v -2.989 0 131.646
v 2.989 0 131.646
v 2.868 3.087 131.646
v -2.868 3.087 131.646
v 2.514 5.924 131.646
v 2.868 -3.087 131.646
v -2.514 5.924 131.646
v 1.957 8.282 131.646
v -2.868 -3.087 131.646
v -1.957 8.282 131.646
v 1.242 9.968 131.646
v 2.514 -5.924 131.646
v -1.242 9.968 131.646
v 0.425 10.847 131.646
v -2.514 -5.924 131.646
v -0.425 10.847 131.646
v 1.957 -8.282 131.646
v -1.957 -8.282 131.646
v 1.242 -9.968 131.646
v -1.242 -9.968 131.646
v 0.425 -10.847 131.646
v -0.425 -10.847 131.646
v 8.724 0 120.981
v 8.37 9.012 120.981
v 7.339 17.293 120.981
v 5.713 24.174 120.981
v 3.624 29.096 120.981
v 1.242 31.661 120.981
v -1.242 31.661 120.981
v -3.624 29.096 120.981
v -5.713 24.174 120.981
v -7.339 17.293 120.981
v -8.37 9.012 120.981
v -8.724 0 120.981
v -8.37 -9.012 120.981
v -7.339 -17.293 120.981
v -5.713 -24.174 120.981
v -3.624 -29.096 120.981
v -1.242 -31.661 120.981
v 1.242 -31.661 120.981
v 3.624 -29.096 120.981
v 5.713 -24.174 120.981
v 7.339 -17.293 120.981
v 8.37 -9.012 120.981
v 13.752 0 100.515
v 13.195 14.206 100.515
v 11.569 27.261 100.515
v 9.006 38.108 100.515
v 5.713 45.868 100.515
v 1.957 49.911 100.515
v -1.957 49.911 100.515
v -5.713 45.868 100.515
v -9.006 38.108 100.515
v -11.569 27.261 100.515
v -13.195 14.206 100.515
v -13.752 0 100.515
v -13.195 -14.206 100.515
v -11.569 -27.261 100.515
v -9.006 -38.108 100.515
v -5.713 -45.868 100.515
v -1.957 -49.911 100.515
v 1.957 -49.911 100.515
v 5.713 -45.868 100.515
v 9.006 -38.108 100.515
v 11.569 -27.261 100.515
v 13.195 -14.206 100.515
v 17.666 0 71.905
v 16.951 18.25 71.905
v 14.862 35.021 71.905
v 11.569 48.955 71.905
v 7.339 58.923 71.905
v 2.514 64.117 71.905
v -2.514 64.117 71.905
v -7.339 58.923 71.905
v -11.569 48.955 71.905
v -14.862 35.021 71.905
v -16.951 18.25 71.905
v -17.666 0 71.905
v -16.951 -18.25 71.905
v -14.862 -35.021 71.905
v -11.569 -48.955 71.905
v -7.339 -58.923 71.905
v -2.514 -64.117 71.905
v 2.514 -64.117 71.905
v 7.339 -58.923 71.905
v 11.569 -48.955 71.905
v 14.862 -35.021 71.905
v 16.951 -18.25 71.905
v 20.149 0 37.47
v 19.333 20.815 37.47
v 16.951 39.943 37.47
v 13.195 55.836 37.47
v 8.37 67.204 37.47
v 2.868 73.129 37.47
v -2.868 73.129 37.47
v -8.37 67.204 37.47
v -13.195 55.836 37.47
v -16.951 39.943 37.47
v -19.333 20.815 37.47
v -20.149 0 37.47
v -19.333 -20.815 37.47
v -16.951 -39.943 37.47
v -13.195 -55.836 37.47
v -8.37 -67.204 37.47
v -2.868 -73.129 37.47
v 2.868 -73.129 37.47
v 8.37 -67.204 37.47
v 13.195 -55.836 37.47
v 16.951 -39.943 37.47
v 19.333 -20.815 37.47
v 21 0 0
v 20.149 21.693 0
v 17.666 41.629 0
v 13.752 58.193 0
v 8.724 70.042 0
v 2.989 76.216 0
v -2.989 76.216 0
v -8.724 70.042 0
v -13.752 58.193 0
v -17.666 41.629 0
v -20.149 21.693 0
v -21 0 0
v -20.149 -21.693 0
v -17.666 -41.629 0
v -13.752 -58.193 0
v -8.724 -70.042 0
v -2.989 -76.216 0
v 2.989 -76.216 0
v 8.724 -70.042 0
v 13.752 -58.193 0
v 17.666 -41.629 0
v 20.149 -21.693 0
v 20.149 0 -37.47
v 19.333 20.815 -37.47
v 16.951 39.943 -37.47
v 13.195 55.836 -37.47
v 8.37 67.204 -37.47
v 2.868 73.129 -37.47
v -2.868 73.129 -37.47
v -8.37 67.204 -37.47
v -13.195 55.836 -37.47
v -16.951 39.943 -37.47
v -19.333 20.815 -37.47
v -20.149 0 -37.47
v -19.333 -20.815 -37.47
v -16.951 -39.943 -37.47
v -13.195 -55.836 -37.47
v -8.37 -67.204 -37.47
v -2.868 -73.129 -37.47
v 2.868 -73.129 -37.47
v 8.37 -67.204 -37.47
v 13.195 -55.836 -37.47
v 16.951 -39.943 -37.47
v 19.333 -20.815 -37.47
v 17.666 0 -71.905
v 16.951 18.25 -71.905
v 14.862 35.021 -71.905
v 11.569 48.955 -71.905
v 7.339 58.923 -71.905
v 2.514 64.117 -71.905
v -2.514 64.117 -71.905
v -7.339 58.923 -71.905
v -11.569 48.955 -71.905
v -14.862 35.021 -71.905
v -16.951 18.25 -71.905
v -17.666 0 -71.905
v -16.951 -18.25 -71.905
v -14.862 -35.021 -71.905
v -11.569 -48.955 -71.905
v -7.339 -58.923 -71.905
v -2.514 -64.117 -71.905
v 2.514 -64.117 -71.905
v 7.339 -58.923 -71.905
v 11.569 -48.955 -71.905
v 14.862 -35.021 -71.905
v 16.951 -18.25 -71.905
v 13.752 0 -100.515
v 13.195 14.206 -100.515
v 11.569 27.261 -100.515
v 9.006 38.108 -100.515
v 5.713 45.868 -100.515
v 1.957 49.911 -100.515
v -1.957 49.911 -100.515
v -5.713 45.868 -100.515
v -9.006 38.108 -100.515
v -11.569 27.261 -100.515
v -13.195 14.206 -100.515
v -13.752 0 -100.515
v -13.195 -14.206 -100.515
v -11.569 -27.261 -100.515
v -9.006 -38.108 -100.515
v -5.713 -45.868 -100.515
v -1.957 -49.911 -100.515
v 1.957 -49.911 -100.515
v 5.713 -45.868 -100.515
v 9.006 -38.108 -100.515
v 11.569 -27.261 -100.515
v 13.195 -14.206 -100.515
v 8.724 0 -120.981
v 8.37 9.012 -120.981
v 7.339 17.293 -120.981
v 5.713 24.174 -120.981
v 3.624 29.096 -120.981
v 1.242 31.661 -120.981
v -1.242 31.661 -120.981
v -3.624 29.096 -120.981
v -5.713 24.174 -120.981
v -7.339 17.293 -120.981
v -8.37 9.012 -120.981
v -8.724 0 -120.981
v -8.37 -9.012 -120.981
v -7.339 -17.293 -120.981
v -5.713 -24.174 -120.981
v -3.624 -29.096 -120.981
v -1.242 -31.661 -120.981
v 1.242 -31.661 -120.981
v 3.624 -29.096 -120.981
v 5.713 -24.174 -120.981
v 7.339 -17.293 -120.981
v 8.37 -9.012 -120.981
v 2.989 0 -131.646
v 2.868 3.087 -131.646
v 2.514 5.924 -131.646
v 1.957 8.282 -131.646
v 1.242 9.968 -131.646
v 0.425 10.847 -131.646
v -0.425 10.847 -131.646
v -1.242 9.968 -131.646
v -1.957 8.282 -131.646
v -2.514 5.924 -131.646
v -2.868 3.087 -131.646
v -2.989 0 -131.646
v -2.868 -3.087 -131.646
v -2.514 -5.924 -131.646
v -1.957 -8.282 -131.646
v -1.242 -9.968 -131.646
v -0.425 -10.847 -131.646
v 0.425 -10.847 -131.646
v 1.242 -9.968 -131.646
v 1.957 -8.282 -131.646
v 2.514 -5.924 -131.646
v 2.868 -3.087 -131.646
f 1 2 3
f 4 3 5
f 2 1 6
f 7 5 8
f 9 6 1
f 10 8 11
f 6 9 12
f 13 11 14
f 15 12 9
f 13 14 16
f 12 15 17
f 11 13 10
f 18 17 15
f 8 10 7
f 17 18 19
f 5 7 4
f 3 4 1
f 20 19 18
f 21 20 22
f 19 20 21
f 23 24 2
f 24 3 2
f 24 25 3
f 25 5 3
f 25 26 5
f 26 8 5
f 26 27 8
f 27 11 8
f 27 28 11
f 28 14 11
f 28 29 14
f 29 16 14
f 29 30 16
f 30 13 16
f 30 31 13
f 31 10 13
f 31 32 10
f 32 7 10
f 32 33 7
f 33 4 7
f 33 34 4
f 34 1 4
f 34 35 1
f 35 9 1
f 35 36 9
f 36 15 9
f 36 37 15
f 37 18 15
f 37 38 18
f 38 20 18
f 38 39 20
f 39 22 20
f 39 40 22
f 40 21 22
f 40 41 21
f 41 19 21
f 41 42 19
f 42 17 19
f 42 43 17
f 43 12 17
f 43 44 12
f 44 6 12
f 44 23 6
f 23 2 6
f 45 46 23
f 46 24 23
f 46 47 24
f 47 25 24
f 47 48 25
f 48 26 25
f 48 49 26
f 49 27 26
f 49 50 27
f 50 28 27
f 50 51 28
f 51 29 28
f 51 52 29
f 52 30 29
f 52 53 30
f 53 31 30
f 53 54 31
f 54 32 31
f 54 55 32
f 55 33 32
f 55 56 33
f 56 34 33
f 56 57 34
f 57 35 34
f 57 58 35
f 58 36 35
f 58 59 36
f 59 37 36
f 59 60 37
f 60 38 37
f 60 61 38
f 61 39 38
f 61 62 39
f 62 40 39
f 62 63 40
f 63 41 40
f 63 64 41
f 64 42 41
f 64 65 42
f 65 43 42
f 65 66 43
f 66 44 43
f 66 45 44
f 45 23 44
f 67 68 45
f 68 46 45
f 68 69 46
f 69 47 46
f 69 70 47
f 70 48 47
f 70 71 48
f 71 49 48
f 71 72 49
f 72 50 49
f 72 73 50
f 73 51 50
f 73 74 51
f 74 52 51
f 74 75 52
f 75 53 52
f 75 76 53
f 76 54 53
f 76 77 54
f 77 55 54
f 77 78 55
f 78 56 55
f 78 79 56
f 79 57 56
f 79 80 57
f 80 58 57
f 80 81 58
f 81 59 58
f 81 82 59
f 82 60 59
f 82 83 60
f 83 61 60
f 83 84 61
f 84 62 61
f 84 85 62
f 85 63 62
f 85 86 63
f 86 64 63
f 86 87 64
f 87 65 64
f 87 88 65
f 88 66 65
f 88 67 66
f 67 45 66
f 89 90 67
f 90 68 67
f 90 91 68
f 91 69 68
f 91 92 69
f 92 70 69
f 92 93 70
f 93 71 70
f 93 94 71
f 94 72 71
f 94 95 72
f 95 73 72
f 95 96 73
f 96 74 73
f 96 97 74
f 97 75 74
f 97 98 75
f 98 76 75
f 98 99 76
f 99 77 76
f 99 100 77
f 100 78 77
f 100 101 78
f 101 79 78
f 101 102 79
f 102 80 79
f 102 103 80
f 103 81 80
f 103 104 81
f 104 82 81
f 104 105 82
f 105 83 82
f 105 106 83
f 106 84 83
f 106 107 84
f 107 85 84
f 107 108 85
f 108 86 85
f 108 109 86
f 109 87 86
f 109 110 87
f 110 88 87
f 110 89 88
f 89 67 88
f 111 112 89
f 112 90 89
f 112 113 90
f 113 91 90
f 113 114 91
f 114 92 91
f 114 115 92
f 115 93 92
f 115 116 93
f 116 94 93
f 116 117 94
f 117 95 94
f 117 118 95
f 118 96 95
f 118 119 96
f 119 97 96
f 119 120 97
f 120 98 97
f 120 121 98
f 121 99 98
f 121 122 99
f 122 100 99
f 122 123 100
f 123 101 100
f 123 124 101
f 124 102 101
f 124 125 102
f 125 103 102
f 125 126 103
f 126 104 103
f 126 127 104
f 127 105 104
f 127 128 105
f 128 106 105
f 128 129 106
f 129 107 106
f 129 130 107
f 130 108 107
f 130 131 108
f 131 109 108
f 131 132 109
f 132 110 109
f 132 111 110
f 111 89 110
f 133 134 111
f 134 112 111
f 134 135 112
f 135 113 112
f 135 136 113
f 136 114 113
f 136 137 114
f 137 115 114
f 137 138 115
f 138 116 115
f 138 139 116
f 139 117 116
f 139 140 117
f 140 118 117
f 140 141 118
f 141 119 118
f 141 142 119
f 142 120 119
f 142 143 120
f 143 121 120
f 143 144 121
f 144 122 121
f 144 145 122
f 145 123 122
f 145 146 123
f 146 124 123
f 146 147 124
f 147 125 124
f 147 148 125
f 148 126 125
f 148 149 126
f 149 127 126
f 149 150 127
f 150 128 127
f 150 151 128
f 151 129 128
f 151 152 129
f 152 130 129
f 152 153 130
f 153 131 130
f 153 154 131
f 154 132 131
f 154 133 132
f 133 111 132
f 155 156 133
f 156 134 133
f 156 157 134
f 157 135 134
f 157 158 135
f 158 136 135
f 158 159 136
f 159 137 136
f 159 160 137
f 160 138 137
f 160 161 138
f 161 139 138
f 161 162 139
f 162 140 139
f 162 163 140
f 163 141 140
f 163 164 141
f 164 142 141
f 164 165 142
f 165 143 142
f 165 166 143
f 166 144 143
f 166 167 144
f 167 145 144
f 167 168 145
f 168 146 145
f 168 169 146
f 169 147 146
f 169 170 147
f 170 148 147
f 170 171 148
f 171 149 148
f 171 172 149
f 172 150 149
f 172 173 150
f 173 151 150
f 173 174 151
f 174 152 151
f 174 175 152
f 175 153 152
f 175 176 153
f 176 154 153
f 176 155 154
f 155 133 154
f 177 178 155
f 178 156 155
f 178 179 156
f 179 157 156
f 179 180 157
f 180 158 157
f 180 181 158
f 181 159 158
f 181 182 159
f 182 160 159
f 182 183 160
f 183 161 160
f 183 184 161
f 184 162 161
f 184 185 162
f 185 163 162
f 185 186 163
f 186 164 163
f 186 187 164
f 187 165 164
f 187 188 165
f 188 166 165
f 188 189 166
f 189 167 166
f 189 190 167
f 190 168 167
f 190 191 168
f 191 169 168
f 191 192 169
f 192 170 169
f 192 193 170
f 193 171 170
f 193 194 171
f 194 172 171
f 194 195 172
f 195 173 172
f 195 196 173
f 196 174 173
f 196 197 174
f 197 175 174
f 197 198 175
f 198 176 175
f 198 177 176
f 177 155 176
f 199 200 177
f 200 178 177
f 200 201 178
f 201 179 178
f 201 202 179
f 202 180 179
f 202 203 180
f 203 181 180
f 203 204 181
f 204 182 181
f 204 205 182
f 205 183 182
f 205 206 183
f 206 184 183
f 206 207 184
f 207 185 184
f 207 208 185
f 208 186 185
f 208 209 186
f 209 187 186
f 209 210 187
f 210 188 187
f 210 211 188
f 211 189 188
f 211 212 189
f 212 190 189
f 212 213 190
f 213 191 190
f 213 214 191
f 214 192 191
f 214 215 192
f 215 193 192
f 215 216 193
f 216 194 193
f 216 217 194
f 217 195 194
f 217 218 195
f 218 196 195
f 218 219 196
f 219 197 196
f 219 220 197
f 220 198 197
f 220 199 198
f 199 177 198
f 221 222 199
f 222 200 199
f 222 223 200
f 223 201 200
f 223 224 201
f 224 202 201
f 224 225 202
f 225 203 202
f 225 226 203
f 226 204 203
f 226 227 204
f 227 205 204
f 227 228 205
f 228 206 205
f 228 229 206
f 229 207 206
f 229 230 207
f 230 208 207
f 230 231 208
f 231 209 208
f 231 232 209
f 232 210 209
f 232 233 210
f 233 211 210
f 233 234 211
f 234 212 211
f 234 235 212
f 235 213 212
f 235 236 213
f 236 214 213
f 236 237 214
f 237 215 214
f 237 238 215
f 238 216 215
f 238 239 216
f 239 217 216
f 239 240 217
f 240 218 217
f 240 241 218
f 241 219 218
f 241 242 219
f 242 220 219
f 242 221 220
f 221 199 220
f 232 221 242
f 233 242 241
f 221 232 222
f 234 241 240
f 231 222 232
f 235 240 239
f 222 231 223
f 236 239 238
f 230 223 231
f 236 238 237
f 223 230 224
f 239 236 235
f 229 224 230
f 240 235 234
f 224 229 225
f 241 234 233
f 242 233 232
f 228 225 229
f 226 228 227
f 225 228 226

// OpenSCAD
// Generated by SolidPython 1.0.1 on 2020-07-29 00:46:45


scale(v = [3, 11, 19]) {
	sphere(r = 7);
}
/***********************************************
*********      SolidPython code:      **********
************************************************
 
# import packages: SolidPython
from solid import *
from solid.utils import *
from itertools import chain, combinations, permutations


class Resize:

    def __init__(self, scad_file):
        self.scad_file = scad_file
        #self.scad_file = import_scad(scad_file)
        # cone/cylinder param:
        self.r1 = 0
        self.r2 = 0
        self.h = 0
        # rectangular prism param:
        self.w = 0
        self.l = 0
        # ellipse param:
        self.r = 0

    # import OpenScad code (file name corresponds to shape)


    # classify shape + parameters
    def assign(self, param1, param2, param3):
        if self.scad_file == 'cone.scad':
            self.r1 = param1
            self.r2 = param2
            self.h = param3
        elif self.scad_file == 'cylinder.scad':
            self.r1 = param1
            self.r2 = param2
            self.h = param3
        elif self.scad_file == 'rectangularPrism.scad':
            self.h = param1
            self.l = param2
            self.w = param3
        else:
            self.r = param1
            self.h = param2

    # resize parameters
    def iterate(self):
        x = range(3, 20, 2)
        i = 1
        if self.scad_file == 'cone.scad':
            tempList = list(permutations(x, 2))
            for temp in tempList:
                param1 = temp[0]
                param2 = temp[1]
                filepath = 'produced_scad_files/' + 'cone' + str(param1) + '_' + str(param2) + '_' + '.scad'
                scad_render_to_file(cylinder(h=param1, r1=param2, r2=0), filepath)

        elif self.scad_file == 'cylinder.scad':
            tempList = list(permutations(x, 3))
            for temp in tempList:
                param1 = temp[0]
                param2 = temp[1]
                filepath = 'produced_scad_files/' + 'cylinder' + str(param1) + '_' + str(param2) + '_' + '.scad'
                scad_render_to_file(cylinder(h=param1, r1=param2, r2=param2), filepath)

        elif self.scad_file == 'rectangularPrism.scad':
            tempList = list(permutations(x, 3))
            for temp in tempList:
                param1 = temp[0]
                param2 = temp[1]
                param3 = temp[2]
                filepath = 'produced_scad_files/' + 'rectangularPrism' + str(param1) + '_' + str(param2) + '_' + str(
                    param3) + '.scad'
                scad_render_to_file(cube(size=(param1, param2, param3)), filepath)

        elif self.scad_file == 'ellipse.scad':
            tempList = list(permutations(x, 4))
            for temp in tempList:
                param1 = temp[0]
                param2 = temp[1]
                param3 = temp[2]
                param4 = temp[3]
                filepath = 'produced_scad_files/' + 'ellipse' + str(param1) + '_' + str(param2) + '_' + str(param3) + '_' + str(param4) + '.scad'
                scad_render_to_file(scale([param1, param2, param3])(sphere(r=param4)), filepath)

    def render_to_scadfile(self):
        scad_render_to_file(scad, 'example.scad') 
 
************************************************/
